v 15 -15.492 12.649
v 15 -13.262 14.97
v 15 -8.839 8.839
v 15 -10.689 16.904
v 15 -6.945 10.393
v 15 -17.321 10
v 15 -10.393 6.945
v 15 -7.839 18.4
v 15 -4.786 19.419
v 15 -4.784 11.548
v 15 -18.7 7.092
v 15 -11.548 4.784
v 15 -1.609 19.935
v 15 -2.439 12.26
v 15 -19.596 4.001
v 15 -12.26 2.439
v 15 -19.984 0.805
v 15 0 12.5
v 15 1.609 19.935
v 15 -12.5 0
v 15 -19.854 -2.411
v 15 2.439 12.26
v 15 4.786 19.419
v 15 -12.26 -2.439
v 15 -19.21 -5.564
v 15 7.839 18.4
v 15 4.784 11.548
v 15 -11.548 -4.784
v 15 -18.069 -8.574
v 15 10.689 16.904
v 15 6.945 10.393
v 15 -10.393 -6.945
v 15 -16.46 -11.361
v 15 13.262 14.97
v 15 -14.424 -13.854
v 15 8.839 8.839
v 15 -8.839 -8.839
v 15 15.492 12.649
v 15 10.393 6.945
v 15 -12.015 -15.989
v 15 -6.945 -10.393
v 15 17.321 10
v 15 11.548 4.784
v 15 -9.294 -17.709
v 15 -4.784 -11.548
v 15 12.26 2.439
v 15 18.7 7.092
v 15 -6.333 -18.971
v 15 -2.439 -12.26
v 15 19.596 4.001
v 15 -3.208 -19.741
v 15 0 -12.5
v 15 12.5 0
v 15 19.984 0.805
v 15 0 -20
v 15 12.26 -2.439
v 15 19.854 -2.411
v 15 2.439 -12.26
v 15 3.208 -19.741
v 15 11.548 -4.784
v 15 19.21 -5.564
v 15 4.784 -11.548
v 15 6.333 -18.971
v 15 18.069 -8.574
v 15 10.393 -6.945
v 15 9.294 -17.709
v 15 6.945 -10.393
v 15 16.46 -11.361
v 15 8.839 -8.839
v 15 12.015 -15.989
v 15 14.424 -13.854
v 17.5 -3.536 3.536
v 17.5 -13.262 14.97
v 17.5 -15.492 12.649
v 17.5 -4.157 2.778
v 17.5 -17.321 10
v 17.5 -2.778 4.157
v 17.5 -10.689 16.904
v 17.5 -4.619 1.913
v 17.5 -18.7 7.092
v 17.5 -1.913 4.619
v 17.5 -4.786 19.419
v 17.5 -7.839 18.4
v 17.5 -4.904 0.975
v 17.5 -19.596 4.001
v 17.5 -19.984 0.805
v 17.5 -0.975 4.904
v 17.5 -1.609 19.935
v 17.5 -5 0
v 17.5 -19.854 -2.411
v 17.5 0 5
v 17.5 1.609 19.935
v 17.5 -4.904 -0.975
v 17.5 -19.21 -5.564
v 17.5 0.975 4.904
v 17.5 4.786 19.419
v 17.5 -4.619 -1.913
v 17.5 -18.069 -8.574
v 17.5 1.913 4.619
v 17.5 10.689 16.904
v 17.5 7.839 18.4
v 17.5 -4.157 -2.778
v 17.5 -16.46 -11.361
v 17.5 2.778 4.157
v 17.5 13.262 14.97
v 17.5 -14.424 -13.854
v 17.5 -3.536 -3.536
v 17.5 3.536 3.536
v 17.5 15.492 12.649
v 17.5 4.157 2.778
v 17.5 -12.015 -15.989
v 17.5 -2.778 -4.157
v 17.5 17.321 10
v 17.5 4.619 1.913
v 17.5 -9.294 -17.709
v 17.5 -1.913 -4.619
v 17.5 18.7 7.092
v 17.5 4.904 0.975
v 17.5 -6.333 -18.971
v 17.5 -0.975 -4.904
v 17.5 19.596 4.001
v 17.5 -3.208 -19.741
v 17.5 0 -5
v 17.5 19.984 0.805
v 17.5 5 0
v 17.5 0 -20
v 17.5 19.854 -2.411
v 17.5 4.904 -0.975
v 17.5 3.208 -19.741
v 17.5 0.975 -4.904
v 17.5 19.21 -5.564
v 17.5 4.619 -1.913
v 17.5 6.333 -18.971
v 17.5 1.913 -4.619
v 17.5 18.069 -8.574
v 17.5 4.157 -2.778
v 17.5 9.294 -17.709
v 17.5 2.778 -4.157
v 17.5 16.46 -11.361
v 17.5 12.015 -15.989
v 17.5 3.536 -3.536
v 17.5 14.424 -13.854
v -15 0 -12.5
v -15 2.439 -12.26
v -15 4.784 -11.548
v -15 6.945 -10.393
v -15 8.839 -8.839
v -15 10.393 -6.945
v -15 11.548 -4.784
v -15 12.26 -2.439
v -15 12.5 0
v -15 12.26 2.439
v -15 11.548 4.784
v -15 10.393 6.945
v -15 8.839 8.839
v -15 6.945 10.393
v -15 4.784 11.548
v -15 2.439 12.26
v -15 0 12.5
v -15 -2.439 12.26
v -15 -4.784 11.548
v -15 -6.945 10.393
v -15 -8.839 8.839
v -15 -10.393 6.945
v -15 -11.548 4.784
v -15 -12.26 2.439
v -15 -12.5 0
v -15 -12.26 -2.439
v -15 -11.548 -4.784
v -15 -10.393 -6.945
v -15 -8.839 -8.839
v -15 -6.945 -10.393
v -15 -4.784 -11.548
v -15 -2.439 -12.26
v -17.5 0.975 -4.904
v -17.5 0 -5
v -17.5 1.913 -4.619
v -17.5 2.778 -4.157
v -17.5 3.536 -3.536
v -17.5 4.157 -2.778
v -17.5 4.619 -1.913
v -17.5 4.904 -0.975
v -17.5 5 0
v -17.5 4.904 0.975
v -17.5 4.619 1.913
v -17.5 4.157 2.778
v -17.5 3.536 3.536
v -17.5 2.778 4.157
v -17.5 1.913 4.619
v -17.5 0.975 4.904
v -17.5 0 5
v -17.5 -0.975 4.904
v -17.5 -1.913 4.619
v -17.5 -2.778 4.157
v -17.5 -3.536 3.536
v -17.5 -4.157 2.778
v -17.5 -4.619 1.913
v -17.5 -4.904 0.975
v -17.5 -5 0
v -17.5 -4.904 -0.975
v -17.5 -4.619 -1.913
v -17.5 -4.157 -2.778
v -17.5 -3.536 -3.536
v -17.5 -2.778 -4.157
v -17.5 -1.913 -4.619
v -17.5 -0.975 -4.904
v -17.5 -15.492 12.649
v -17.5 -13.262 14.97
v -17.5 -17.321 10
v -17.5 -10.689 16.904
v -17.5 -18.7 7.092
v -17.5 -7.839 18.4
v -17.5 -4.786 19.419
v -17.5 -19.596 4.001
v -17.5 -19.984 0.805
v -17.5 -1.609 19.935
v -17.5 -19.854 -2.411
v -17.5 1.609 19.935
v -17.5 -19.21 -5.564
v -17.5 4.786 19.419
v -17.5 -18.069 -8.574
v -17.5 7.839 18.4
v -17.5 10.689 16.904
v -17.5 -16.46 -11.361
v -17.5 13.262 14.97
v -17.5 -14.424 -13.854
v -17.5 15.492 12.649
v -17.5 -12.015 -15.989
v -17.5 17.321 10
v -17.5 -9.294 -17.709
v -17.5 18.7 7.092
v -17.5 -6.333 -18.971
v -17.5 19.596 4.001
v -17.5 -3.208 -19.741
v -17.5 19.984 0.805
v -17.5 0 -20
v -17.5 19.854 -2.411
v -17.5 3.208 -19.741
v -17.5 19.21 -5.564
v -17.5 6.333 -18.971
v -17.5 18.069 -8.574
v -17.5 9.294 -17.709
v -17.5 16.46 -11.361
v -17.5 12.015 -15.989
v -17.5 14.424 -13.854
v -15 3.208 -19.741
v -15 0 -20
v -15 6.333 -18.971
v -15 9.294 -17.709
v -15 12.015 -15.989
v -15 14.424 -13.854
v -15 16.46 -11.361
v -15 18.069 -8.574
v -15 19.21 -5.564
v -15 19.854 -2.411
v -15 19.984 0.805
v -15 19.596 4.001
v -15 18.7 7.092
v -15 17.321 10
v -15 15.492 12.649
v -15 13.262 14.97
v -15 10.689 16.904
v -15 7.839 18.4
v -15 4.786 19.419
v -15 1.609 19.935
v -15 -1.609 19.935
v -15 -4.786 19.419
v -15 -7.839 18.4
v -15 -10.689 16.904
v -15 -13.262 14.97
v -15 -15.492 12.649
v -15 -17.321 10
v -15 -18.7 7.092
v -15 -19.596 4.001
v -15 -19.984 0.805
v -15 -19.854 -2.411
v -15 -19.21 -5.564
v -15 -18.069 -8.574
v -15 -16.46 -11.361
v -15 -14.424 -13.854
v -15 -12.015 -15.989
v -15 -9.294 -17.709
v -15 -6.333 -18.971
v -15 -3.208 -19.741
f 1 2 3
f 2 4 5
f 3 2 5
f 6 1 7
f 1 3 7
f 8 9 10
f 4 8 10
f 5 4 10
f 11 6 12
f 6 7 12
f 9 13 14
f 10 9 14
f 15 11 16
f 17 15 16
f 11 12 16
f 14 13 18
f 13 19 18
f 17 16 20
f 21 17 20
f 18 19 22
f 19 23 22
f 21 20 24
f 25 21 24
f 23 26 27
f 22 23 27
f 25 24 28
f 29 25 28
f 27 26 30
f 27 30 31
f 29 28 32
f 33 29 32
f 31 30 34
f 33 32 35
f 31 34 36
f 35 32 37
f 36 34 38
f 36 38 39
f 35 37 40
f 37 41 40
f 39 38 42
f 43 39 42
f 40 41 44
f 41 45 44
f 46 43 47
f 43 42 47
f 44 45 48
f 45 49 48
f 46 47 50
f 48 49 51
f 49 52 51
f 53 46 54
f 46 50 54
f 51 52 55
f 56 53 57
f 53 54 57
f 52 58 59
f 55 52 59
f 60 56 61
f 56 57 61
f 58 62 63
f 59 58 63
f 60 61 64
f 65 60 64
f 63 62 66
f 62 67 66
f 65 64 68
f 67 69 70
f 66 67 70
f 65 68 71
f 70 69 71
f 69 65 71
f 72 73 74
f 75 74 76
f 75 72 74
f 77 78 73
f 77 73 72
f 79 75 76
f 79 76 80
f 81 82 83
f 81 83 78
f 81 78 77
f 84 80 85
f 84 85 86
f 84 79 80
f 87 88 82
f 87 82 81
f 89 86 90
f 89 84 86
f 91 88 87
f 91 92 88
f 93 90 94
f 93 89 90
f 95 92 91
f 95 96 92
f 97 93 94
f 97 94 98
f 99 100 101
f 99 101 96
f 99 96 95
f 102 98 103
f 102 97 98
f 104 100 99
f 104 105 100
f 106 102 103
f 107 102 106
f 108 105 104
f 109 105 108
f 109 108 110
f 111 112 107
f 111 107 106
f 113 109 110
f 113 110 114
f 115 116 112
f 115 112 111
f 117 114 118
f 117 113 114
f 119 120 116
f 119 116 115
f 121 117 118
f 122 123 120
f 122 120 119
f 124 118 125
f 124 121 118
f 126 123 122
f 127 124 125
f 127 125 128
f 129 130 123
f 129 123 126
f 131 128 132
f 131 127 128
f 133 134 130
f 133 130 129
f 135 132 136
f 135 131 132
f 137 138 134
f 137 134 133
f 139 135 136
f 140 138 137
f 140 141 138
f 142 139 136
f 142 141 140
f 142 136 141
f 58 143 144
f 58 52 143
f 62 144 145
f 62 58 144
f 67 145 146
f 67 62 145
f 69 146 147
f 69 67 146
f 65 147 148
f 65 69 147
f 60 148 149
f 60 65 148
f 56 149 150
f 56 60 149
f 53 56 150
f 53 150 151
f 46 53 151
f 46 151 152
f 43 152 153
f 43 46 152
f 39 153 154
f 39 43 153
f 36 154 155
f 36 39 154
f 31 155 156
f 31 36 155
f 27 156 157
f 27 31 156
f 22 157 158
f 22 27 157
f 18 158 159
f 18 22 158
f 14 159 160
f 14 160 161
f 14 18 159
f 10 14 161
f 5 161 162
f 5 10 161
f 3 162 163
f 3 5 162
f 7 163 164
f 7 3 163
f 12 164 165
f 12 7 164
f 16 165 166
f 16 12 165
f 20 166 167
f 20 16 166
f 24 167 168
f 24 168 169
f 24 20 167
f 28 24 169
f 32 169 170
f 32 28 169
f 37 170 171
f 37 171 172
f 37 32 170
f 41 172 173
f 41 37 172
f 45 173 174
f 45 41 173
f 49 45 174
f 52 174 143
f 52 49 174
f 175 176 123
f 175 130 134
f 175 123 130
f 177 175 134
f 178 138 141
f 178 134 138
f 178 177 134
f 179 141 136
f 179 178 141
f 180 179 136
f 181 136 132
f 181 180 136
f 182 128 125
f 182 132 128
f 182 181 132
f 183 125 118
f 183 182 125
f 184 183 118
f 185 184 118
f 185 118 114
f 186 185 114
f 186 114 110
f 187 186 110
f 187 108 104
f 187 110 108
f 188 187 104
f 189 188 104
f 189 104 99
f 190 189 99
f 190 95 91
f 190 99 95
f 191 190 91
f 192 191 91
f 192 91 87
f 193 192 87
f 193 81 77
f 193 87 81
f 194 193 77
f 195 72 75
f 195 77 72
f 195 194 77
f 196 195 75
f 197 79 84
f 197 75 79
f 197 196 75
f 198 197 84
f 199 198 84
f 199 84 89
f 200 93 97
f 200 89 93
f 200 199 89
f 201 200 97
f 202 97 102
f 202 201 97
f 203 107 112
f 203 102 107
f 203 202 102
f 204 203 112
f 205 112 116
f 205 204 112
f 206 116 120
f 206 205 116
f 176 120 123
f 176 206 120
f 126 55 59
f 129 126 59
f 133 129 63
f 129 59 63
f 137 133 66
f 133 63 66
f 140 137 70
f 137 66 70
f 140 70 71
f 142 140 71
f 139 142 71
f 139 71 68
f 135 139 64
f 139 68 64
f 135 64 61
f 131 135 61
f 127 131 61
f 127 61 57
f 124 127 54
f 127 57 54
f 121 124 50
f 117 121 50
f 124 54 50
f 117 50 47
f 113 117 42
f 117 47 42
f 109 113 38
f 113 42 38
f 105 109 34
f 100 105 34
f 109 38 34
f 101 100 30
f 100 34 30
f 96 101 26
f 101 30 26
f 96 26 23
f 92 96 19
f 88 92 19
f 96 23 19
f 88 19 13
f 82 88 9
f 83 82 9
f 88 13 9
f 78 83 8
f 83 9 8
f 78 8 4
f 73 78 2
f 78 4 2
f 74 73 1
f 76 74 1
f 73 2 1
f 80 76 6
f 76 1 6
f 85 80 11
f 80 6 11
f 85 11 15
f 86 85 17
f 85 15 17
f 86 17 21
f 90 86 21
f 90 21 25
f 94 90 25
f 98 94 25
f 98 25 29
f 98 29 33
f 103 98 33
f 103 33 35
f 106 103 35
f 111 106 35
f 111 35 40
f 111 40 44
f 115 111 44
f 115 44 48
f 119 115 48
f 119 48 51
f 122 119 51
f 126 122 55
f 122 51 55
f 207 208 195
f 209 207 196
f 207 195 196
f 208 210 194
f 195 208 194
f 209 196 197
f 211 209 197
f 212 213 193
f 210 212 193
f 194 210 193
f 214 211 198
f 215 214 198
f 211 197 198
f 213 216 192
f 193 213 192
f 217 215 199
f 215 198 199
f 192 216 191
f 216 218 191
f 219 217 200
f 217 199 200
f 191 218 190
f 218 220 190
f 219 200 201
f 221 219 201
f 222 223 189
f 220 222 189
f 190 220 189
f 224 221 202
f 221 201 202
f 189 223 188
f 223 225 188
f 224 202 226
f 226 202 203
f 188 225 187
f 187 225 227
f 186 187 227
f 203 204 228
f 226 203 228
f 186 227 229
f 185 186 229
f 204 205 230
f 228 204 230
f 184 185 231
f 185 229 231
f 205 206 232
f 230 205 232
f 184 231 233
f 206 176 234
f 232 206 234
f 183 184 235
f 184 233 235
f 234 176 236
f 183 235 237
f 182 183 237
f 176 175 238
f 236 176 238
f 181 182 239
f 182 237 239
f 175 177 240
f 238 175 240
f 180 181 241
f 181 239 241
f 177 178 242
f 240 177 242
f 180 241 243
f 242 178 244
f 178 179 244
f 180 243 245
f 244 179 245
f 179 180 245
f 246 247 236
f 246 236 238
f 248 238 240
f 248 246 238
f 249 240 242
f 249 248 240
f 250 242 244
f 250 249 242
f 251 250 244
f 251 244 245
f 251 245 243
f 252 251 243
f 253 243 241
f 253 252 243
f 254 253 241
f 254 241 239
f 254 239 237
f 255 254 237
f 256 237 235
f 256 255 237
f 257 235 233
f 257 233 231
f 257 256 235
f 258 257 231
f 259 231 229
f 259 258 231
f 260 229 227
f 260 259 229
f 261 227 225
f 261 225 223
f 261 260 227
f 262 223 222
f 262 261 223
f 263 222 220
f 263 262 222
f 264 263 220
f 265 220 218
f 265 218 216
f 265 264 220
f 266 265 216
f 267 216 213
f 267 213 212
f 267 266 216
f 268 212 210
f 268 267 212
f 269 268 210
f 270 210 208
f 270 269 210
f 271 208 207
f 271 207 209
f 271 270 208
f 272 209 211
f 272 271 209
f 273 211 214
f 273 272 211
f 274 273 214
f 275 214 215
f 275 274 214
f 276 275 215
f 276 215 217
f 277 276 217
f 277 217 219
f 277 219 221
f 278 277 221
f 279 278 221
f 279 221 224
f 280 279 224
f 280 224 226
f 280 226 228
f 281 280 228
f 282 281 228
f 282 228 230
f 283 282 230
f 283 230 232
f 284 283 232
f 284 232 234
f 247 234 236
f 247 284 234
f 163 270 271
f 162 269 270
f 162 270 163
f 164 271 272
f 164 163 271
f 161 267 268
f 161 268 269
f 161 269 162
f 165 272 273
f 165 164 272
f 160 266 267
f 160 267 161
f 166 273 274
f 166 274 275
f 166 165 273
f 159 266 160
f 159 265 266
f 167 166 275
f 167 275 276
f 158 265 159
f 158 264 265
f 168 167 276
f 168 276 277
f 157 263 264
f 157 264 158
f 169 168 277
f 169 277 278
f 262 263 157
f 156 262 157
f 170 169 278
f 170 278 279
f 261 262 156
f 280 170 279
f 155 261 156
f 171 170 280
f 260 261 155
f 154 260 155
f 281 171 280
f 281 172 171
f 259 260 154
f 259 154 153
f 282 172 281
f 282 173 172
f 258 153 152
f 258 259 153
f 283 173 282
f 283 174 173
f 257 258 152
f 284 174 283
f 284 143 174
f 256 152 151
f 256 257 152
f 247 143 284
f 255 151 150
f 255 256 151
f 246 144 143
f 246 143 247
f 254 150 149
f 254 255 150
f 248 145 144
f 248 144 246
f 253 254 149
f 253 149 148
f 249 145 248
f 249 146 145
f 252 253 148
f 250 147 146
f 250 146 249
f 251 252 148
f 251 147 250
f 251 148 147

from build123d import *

# Parameters (mm, degrees)
SKETCH1_R               = 12.5
SKETCH1_R_2             = 5
BOSS_EXTRUDE1_DEPTH     = 15
SKETCH2_R               = 20
BOSS_EXTRUDE2_DEPTH     = 2.5
CUT_EXTRUDE1_DEPTH      = 46
CUT_EXTRUDE1_DEPTH_BACK = 46
SKETCH3_R               = 5


with BuildPart() as part:
    # Sketch1 → Boss-Extrude1 (new, symmetric)
    with BuildSketch(Plane(origin=(0, 0, 0), x_dir=(0, 0, -1), z_dir=(1, 0, 0))):
        Circle(SKETCH1_R)
        Circle(SKETCH1_R_2, mode=Mode.SUBTRACT)
    extrude(amount=BOSS_EXTRUDE1_DEPTH, both=True)

    # Sketch2 → Boss-Extrude2 (add)
    with BuildSketch(Plane(origin=(15, 0, 0), x_dir=(0, 0, -1), z_dir=(1, 0, 0))):
        Circle(SKETCH2_R)
    boss_extrude2 = extrude(amount=BOSS_EXTRUDE2_DEPTH)

    # Mirror1: Boss-Extrude2 across plane
    add(boss_extrude2.mirror(Plane(origin=(0, 0, 0), x_dir=(0, 0, 1), z_dir=(1, 0, 0))))

    # Sketch3 → Cut-Extrude1 (cut, two sides: drawn at the far end of the back side and taken through both)
    with BuildSketch(Plane(origin=(17.5, 0, 0), x_dir=(0, 0, -1), z_dir=(1, 0, 0)).offset(-CUT_EXTRUDE1_DEPTH_BACK)):
        Circle(SKETCH3_R)
    extrude(amount=CUT_EXTRUDE1_DEPTH + CUT_EXTRUDE1_DEPTH_BACK, mode=Mode.SUBTRACT)


solid = part.part
